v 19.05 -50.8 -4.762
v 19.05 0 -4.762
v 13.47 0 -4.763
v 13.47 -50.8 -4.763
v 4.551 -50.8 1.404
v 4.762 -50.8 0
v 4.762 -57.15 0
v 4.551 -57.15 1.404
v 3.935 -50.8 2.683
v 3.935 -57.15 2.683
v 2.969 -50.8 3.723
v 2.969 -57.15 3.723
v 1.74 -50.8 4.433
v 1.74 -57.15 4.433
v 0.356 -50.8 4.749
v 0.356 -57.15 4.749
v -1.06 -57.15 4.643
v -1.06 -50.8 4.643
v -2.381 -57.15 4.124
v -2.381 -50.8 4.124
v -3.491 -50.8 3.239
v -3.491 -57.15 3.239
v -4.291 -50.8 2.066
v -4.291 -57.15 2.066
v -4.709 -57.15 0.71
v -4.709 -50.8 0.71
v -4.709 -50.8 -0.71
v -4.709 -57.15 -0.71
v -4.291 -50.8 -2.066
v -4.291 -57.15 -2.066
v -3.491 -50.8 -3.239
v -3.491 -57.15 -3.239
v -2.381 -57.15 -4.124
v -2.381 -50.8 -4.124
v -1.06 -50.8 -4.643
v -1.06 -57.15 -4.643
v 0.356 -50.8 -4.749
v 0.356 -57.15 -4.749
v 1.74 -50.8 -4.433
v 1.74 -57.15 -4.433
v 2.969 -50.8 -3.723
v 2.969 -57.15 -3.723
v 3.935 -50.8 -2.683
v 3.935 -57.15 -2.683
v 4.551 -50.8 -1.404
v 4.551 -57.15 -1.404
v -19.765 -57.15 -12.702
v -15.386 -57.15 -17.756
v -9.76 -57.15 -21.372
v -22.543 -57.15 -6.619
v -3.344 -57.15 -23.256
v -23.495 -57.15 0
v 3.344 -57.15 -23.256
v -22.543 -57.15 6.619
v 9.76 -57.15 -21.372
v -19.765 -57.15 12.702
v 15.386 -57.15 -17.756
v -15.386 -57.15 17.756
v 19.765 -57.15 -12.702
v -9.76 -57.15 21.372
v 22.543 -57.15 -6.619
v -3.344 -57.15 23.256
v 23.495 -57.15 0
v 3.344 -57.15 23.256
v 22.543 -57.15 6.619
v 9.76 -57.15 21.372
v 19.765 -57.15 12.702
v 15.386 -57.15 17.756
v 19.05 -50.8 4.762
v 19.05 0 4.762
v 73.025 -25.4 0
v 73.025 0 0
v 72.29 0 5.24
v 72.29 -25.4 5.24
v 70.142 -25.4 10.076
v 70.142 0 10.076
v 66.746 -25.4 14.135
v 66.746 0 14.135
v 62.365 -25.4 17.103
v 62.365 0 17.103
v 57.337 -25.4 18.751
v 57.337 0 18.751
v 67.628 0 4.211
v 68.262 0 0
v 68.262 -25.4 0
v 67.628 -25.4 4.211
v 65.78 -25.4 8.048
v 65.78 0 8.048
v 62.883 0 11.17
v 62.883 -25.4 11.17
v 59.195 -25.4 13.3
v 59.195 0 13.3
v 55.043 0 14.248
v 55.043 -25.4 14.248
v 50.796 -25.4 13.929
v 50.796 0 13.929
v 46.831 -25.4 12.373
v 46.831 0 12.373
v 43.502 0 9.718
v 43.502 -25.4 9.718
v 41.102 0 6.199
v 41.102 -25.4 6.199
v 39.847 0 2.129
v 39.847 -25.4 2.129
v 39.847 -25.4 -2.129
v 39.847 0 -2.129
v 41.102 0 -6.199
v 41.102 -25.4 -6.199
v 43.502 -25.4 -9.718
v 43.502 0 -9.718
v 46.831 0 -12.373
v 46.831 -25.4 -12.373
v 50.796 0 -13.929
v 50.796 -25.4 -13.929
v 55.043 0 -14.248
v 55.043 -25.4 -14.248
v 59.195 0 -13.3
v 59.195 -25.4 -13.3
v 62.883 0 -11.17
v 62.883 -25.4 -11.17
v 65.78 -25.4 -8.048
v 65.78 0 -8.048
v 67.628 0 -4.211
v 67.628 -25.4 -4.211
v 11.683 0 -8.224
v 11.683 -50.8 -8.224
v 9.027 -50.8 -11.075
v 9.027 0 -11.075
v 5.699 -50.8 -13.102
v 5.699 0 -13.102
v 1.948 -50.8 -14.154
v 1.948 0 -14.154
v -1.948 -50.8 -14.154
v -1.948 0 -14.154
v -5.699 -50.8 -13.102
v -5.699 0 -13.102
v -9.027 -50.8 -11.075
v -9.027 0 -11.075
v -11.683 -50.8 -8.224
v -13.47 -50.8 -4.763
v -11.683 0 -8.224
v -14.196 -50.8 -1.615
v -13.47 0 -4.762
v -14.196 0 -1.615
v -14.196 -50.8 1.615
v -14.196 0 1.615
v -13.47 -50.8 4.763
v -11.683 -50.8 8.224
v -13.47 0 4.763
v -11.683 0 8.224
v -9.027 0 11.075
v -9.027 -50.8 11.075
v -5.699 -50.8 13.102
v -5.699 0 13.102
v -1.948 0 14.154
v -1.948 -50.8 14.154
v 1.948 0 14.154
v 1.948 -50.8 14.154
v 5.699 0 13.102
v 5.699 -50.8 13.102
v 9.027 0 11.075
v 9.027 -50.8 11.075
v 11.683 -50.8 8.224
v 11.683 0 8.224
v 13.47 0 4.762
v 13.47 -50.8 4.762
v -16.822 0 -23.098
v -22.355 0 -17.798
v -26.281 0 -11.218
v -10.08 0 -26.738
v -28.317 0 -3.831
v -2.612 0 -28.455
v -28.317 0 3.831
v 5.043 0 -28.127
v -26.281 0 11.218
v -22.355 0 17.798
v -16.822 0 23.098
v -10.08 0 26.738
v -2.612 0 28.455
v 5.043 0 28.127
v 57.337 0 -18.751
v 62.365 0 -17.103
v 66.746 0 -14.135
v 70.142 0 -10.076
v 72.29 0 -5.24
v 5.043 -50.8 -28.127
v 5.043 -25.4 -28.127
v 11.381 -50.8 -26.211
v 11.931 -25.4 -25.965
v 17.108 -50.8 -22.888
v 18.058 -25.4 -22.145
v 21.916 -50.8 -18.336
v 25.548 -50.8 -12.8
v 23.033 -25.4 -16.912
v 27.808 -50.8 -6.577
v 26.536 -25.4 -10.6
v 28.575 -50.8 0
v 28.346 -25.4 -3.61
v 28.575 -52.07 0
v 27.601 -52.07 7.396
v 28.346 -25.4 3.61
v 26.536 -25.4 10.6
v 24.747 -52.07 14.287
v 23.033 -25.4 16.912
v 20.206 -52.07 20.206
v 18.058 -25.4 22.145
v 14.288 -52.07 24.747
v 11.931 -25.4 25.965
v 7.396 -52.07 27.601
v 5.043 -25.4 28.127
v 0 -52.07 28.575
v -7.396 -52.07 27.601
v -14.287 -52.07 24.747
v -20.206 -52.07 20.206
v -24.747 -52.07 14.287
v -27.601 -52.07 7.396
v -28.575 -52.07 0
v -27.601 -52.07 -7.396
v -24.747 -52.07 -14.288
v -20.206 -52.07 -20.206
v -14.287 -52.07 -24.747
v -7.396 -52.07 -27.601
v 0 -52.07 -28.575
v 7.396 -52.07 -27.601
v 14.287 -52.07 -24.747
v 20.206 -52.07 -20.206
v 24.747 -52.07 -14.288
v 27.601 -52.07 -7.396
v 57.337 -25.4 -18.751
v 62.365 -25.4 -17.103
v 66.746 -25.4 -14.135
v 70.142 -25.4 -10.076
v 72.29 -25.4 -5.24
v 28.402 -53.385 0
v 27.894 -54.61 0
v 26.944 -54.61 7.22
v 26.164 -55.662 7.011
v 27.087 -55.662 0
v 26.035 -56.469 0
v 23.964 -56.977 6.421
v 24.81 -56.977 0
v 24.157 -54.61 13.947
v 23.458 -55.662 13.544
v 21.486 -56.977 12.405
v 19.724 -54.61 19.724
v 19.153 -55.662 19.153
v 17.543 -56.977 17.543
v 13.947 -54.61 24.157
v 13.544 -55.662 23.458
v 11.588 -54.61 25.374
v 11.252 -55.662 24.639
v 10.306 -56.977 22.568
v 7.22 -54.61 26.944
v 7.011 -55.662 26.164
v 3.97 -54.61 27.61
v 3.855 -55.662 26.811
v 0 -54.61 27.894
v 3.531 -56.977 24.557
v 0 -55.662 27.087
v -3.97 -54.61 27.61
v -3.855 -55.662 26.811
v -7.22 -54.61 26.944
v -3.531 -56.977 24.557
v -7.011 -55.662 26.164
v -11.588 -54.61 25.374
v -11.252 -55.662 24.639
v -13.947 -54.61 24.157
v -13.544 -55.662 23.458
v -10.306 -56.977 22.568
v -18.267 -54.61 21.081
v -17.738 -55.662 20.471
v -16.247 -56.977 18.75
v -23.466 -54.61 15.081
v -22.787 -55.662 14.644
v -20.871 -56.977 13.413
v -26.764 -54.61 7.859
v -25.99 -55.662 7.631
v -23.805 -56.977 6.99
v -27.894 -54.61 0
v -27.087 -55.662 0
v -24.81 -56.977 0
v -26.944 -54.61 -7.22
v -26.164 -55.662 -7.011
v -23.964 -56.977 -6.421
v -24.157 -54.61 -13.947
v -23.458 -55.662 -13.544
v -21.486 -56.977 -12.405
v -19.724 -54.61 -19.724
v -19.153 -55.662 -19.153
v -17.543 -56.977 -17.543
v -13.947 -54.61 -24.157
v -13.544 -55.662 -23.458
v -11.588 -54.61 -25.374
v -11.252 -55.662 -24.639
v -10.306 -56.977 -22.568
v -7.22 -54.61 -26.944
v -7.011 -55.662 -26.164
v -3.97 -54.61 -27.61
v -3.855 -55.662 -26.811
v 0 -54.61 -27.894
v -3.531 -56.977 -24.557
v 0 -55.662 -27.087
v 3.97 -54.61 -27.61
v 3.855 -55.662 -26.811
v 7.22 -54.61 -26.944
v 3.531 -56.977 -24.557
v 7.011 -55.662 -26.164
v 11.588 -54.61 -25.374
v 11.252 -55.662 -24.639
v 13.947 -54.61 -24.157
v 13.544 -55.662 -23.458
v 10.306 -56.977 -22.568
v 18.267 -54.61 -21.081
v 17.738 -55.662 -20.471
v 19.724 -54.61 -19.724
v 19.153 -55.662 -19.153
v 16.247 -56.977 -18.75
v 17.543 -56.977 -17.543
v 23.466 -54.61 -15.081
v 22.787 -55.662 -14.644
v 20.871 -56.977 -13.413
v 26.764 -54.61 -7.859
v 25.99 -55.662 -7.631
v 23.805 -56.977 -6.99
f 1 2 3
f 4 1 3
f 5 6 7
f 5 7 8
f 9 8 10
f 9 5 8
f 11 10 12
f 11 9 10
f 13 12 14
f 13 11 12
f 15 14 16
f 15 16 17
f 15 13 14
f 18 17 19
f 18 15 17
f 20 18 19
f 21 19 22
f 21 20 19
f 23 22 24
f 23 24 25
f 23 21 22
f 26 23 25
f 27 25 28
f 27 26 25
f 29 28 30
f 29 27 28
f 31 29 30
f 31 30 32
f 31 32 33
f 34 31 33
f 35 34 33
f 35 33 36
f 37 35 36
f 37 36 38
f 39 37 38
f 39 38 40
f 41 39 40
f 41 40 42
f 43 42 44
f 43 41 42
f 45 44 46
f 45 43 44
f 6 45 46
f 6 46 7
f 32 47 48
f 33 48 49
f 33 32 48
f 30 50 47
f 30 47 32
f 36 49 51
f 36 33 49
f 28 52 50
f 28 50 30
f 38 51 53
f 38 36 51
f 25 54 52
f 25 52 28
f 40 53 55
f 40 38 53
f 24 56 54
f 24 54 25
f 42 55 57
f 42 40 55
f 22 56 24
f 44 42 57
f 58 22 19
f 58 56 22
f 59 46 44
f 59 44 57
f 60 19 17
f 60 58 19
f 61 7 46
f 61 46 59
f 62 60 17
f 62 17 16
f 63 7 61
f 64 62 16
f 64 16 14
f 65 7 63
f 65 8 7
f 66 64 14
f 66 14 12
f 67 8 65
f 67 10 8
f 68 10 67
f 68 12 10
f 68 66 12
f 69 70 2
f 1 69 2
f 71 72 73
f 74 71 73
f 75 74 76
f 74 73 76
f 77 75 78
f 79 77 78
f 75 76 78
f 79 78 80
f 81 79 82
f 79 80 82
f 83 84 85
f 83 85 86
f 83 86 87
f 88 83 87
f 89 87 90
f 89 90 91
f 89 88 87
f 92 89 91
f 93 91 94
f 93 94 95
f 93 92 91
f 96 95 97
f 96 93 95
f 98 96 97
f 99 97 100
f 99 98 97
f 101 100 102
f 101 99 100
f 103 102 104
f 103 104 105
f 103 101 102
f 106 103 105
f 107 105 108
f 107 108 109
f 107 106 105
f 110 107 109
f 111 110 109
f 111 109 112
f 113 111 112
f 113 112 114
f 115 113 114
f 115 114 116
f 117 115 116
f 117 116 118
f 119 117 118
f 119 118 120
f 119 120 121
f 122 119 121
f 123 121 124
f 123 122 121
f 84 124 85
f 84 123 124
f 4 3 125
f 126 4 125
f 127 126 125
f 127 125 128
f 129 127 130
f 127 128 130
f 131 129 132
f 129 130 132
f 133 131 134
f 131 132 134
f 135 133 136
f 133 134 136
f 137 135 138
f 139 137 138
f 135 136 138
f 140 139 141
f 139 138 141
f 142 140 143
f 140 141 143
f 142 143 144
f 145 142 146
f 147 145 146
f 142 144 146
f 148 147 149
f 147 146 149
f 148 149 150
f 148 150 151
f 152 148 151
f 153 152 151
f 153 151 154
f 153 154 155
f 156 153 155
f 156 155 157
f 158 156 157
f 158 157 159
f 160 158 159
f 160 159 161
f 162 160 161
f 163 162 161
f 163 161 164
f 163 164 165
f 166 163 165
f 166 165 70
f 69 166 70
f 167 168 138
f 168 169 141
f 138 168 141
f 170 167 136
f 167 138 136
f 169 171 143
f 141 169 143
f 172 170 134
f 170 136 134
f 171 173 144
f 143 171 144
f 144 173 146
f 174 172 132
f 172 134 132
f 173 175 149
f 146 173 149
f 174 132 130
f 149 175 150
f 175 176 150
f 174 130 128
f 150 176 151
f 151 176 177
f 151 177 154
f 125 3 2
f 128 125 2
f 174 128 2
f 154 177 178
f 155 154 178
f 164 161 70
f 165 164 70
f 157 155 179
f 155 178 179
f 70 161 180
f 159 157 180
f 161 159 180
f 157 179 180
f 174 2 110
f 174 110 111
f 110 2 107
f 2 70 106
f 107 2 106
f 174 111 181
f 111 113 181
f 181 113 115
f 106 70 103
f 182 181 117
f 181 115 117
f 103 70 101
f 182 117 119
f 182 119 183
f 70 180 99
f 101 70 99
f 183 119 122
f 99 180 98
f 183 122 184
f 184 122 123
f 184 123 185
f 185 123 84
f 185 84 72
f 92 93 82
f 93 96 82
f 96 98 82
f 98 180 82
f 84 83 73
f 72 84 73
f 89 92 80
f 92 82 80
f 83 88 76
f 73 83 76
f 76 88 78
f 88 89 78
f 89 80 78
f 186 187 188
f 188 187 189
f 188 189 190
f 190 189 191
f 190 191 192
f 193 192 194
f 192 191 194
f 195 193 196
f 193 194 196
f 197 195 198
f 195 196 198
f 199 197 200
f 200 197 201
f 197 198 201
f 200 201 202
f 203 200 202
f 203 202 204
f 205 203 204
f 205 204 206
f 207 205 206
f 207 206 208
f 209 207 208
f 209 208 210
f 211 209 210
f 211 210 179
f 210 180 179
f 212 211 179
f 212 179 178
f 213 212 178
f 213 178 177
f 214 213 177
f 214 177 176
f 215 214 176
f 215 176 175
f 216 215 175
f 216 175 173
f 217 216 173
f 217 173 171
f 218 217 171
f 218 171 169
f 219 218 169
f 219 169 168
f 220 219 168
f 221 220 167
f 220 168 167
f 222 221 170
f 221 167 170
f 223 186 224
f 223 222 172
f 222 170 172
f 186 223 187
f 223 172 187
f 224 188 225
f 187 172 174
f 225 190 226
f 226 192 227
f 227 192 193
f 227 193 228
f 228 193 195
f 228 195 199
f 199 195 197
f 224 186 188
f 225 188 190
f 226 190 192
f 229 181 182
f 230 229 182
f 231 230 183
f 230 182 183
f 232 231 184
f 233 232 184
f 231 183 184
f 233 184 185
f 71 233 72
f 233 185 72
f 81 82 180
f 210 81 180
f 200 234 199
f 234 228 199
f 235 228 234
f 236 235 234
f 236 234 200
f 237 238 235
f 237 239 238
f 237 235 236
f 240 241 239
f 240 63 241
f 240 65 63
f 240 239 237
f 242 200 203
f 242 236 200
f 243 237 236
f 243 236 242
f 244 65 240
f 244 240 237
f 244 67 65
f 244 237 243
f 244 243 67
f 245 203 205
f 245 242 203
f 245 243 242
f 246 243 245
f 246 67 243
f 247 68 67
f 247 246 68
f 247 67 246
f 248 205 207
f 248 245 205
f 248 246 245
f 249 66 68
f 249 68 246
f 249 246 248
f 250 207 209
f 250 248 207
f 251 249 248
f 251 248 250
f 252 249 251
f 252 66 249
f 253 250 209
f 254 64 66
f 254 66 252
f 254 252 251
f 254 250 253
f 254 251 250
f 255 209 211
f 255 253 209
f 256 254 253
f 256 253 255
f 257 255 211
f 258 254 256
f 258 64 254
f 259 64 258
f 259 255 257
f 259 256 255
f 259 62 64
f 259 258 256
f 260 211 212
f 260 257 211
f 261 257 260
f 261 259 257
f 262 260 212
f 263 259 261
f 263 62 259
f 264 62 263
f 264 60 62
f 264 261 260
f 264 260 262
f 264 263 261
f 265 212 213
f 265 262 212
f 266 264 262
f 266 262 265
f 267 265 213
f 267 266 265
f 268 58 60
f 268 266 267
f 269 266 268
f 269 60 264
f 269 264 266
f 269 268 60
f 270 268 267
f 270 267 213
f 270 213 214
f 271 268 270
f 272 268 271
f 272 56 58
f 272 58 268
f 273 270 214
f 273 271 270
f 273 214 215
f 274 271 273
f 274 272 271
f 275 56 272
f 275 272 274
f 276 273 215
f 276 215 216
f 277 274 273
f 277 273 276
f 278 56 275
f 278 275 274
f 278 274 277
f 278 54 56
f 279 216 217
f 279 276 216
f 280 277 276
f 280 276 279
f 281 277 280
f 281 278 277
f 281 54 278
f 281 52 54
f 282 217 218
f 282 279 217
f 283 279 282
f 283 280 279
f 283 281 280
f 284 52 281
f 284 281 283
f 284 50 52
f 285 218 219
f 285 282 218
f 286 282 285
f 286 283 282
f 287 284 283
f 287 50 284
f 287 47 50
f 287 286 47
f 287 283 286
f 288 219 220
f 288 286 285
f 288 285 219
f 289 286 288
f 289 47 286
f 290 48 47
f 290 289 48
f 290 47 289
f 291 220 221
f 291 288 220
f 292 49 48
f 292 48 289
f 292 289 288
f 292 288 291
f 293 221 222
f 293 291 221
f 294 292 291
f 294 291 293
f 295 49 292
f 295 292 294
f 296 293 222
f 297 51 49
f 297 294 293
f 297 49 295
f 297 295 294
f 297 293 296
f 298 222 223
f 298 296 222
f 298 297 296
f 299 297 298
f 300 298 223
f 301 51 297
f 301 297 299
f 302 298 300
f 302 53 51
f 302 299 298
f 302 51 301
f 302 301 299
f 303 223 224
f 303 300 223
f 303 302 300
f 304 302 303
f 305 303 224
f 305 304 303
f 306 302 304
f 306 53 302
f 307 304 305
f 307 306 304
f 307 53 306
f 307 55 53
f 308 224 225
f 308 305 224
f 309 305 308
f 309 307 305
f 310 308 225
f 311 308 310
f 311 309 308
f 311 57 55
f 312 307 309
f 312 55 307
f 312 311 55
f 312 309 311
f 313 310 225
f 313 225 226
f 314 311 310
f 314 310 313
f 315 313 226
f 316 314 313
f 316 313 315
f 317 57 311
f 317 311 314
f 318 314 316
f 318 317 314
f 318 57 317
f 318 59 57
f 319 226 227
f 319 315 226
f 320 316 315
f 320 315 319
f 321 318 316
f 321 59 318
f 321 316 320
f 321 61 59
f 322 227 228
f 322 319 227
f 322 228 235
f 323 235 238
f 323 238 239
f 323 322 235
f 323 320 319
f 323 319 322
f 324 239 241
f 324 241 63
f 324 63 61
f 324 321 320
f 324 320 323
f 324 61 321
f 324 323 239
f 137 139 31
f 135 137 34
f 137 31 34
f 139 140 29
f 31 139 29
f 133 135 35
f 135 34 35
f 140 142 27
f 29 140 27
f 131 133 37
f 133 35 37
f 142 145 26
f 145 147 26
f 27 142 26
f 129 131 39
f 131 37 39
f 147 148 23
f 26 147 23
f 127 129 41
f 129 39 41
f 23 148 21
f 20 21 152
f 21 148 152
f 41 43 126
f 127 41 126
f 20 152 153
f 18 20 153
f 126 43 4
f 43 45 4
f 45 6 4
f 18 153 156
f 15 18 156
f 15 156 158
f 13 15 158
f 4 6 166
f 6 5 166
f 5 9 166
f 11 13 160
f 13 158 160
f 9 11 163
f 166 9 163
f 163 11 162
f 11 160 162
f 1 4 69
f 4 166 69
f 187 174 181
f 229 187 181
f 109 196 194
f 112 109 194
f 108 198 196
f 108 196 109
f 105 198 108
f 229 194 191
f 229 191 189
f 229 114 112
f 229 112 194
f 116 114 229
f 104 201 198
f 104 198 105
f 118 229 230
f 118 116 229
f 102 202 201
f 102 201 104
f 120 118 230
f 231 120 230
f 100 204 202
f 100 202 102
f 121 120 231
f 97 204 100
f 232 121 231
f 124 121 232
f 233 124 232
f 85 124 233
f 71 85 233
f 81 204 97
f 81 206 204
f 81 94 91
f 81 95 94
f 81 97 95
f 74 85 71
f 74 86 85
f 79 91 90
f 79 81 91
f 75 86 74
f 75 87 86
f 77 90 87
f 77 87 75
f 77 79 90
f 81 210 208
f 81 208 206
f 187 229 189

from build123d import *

# Parameters (mm, degrees)
F0_R     = 14.2875
F1_DEPTH = 25.4
F2_DEPTH = 50.8
F3_R     = 28.575
F3_R_2   = 4.7625
F4_DEPTH = 6.35
F5_R     = 5.08


with BuildPart() as f1:
    # F0 (on Front) → F1 (new body)
    with BuildSketch(Plane.XZ):
        with BuildLine():
            ThreePointArc((5.0426470588, -28.1265414802), (21.9160245563, -18.3362616868), (28.575, 0))
            ThreePointArc((28.575, 0), (21.9160245563, 18.3362616868), (5.0426470588, 28.1265414802))
            ThreePointArc((5.0426470588, 28.1265414802), (-28.575, 0), (5.0426470588, -28.1265414802))
        make_face()
        with BuildLine():
            ThreePointArc((-13.4703841816, 4.7625), (0, 14.2875), (13.4703841816, 4.7625))
            Line((13.4703841816, 4.7625), (19.05, 4.7625))
            Line((19.05, 4.7625), (19.05, -4.7625))
            Line((19.05, -4.7625), (13.4703841816, -4.7625))
            ThreePointArc((13.4703841816, -4.7625), (0, -14.2875), (-13.4703841816, -4.7625))
            Line((-13.4703841816, -4.7625), (-19.05, -4.7625))
            Line((-19.05, -4.7625), (-19.05, 4.7625))
            Line((-19.05, 4.7625), (-13.4703841816, 4.7625))
        make_face(mode=Mode.SUBTRACT)
        with BuildLine():
            ThreePointArc((5.0426470588, 28.1265414802), (21.9160245563, 18.3362616868), (28.575, 0))
            ThreePointArc((28.575, 0), (21.9160245563, -18.3362616868), (5.0426470588, -28.1265414802))
            Line((5.0426470588, -28.1265414802), (57.3367647059, -18.7510276535))
            ThreePointArc((57.3367647059, -18.7510276535), (34.925, 0), (57.3367647059, 18.7510276535))
            Line((57.3367647059, 18.7510276535), (5.0426470588, 28.1265414802))
        make_face()
        with BuildLine():
            ThreePointArc((73.025, 0), (68.5856830375, 12.2241744579), (57.3367647059, 18.7510276535))
            ThreePointArc((57.3367647059, 18.7510276535), (34.925, 0), (57.3367647059, -18.7510276535))
            ThreePointArc((57.3367647059, -18.7510276535), (68.5856830375, -12.2241744579), (73.025, 0))
        make_face()
        with Locations((53.975, 0)):
            Circle(F0_R, mode=Mode.SUBTRACT)
    extrude(amount=F1_DEPTH)

    # F0 (on Front) → F2 (join)
    with BuildSketch(Plane.XZ):
        with BuildLine():
            ThreePointArc((5.0426470588, -28.1265414802), (21.9160245563, -18.3362616868), (28.575, 0))
            ThreePointArc((28.575, 0), (21.9160245563, 18.3362616868), (5.0426470588, 28.1265414802))
            ThreePointArc((5.0426470588, 28.1265414802), (-28.575, 0), (5.0426470588, -28.1265414802))
        make_face()
        with BuildLine():
            ThreePointArc((-13.4703841816, 4.7625), (0, 14.2875), (13.4703841816, 4.7625))
            Line((13.4703841816, 4.7625), (19.05, 4.7625))
            Line((19.05, 4.7625), (19.05, -4.7625))
            Line((19.05, -4.7625), (13.4703841816, -4.7625))
            ThreePointArc((13.4703841816, -4.7625), (0, -14.2875), (-13.4703841816, -4.7625))
            Line((-13.4703841816, -4.7625), (-19.05, -4.7625))
            Line((-19.05, -4.7625), (-19.05, 4.7625))
            Line((-19.05, 4.7625), (-13.4703841816, 4.7625))
        make_face(mode=Mode.SUBTRACT)
        with BuildLine():
            ThreePointArc((-13.4703841816, -4.7625), (-14.2875, 0), (-13.4703841816, 4.7625))
            Line((-13.4703841816, 4.7625), (-19.05, 4.7625))
            Line((-19.05, 4.7625), (-19.05, -4.7625))
            Line((-19.05, -4.7625), (-13.4703841816, -4.7625))
        make_face()
    extrude(amount=F2_DEPTH)

    # F3 (on face) → F4 (join)
    with BuildSketch(Plane.XZ.offset(50.8)):
        Circle(F3_R)
        Circle(F3_R_2, mode=Mode.SUBTRACT)
    extrude(amount=F4_DEPTH)

    # F5
    f5_edges = [f1.edges().sort_by_distance(p)[0] for p in [
        (-28.575, -57.15, 0),
    ]]
    fillet(f5_edges, radius=F5_R)


solid = f1.part
